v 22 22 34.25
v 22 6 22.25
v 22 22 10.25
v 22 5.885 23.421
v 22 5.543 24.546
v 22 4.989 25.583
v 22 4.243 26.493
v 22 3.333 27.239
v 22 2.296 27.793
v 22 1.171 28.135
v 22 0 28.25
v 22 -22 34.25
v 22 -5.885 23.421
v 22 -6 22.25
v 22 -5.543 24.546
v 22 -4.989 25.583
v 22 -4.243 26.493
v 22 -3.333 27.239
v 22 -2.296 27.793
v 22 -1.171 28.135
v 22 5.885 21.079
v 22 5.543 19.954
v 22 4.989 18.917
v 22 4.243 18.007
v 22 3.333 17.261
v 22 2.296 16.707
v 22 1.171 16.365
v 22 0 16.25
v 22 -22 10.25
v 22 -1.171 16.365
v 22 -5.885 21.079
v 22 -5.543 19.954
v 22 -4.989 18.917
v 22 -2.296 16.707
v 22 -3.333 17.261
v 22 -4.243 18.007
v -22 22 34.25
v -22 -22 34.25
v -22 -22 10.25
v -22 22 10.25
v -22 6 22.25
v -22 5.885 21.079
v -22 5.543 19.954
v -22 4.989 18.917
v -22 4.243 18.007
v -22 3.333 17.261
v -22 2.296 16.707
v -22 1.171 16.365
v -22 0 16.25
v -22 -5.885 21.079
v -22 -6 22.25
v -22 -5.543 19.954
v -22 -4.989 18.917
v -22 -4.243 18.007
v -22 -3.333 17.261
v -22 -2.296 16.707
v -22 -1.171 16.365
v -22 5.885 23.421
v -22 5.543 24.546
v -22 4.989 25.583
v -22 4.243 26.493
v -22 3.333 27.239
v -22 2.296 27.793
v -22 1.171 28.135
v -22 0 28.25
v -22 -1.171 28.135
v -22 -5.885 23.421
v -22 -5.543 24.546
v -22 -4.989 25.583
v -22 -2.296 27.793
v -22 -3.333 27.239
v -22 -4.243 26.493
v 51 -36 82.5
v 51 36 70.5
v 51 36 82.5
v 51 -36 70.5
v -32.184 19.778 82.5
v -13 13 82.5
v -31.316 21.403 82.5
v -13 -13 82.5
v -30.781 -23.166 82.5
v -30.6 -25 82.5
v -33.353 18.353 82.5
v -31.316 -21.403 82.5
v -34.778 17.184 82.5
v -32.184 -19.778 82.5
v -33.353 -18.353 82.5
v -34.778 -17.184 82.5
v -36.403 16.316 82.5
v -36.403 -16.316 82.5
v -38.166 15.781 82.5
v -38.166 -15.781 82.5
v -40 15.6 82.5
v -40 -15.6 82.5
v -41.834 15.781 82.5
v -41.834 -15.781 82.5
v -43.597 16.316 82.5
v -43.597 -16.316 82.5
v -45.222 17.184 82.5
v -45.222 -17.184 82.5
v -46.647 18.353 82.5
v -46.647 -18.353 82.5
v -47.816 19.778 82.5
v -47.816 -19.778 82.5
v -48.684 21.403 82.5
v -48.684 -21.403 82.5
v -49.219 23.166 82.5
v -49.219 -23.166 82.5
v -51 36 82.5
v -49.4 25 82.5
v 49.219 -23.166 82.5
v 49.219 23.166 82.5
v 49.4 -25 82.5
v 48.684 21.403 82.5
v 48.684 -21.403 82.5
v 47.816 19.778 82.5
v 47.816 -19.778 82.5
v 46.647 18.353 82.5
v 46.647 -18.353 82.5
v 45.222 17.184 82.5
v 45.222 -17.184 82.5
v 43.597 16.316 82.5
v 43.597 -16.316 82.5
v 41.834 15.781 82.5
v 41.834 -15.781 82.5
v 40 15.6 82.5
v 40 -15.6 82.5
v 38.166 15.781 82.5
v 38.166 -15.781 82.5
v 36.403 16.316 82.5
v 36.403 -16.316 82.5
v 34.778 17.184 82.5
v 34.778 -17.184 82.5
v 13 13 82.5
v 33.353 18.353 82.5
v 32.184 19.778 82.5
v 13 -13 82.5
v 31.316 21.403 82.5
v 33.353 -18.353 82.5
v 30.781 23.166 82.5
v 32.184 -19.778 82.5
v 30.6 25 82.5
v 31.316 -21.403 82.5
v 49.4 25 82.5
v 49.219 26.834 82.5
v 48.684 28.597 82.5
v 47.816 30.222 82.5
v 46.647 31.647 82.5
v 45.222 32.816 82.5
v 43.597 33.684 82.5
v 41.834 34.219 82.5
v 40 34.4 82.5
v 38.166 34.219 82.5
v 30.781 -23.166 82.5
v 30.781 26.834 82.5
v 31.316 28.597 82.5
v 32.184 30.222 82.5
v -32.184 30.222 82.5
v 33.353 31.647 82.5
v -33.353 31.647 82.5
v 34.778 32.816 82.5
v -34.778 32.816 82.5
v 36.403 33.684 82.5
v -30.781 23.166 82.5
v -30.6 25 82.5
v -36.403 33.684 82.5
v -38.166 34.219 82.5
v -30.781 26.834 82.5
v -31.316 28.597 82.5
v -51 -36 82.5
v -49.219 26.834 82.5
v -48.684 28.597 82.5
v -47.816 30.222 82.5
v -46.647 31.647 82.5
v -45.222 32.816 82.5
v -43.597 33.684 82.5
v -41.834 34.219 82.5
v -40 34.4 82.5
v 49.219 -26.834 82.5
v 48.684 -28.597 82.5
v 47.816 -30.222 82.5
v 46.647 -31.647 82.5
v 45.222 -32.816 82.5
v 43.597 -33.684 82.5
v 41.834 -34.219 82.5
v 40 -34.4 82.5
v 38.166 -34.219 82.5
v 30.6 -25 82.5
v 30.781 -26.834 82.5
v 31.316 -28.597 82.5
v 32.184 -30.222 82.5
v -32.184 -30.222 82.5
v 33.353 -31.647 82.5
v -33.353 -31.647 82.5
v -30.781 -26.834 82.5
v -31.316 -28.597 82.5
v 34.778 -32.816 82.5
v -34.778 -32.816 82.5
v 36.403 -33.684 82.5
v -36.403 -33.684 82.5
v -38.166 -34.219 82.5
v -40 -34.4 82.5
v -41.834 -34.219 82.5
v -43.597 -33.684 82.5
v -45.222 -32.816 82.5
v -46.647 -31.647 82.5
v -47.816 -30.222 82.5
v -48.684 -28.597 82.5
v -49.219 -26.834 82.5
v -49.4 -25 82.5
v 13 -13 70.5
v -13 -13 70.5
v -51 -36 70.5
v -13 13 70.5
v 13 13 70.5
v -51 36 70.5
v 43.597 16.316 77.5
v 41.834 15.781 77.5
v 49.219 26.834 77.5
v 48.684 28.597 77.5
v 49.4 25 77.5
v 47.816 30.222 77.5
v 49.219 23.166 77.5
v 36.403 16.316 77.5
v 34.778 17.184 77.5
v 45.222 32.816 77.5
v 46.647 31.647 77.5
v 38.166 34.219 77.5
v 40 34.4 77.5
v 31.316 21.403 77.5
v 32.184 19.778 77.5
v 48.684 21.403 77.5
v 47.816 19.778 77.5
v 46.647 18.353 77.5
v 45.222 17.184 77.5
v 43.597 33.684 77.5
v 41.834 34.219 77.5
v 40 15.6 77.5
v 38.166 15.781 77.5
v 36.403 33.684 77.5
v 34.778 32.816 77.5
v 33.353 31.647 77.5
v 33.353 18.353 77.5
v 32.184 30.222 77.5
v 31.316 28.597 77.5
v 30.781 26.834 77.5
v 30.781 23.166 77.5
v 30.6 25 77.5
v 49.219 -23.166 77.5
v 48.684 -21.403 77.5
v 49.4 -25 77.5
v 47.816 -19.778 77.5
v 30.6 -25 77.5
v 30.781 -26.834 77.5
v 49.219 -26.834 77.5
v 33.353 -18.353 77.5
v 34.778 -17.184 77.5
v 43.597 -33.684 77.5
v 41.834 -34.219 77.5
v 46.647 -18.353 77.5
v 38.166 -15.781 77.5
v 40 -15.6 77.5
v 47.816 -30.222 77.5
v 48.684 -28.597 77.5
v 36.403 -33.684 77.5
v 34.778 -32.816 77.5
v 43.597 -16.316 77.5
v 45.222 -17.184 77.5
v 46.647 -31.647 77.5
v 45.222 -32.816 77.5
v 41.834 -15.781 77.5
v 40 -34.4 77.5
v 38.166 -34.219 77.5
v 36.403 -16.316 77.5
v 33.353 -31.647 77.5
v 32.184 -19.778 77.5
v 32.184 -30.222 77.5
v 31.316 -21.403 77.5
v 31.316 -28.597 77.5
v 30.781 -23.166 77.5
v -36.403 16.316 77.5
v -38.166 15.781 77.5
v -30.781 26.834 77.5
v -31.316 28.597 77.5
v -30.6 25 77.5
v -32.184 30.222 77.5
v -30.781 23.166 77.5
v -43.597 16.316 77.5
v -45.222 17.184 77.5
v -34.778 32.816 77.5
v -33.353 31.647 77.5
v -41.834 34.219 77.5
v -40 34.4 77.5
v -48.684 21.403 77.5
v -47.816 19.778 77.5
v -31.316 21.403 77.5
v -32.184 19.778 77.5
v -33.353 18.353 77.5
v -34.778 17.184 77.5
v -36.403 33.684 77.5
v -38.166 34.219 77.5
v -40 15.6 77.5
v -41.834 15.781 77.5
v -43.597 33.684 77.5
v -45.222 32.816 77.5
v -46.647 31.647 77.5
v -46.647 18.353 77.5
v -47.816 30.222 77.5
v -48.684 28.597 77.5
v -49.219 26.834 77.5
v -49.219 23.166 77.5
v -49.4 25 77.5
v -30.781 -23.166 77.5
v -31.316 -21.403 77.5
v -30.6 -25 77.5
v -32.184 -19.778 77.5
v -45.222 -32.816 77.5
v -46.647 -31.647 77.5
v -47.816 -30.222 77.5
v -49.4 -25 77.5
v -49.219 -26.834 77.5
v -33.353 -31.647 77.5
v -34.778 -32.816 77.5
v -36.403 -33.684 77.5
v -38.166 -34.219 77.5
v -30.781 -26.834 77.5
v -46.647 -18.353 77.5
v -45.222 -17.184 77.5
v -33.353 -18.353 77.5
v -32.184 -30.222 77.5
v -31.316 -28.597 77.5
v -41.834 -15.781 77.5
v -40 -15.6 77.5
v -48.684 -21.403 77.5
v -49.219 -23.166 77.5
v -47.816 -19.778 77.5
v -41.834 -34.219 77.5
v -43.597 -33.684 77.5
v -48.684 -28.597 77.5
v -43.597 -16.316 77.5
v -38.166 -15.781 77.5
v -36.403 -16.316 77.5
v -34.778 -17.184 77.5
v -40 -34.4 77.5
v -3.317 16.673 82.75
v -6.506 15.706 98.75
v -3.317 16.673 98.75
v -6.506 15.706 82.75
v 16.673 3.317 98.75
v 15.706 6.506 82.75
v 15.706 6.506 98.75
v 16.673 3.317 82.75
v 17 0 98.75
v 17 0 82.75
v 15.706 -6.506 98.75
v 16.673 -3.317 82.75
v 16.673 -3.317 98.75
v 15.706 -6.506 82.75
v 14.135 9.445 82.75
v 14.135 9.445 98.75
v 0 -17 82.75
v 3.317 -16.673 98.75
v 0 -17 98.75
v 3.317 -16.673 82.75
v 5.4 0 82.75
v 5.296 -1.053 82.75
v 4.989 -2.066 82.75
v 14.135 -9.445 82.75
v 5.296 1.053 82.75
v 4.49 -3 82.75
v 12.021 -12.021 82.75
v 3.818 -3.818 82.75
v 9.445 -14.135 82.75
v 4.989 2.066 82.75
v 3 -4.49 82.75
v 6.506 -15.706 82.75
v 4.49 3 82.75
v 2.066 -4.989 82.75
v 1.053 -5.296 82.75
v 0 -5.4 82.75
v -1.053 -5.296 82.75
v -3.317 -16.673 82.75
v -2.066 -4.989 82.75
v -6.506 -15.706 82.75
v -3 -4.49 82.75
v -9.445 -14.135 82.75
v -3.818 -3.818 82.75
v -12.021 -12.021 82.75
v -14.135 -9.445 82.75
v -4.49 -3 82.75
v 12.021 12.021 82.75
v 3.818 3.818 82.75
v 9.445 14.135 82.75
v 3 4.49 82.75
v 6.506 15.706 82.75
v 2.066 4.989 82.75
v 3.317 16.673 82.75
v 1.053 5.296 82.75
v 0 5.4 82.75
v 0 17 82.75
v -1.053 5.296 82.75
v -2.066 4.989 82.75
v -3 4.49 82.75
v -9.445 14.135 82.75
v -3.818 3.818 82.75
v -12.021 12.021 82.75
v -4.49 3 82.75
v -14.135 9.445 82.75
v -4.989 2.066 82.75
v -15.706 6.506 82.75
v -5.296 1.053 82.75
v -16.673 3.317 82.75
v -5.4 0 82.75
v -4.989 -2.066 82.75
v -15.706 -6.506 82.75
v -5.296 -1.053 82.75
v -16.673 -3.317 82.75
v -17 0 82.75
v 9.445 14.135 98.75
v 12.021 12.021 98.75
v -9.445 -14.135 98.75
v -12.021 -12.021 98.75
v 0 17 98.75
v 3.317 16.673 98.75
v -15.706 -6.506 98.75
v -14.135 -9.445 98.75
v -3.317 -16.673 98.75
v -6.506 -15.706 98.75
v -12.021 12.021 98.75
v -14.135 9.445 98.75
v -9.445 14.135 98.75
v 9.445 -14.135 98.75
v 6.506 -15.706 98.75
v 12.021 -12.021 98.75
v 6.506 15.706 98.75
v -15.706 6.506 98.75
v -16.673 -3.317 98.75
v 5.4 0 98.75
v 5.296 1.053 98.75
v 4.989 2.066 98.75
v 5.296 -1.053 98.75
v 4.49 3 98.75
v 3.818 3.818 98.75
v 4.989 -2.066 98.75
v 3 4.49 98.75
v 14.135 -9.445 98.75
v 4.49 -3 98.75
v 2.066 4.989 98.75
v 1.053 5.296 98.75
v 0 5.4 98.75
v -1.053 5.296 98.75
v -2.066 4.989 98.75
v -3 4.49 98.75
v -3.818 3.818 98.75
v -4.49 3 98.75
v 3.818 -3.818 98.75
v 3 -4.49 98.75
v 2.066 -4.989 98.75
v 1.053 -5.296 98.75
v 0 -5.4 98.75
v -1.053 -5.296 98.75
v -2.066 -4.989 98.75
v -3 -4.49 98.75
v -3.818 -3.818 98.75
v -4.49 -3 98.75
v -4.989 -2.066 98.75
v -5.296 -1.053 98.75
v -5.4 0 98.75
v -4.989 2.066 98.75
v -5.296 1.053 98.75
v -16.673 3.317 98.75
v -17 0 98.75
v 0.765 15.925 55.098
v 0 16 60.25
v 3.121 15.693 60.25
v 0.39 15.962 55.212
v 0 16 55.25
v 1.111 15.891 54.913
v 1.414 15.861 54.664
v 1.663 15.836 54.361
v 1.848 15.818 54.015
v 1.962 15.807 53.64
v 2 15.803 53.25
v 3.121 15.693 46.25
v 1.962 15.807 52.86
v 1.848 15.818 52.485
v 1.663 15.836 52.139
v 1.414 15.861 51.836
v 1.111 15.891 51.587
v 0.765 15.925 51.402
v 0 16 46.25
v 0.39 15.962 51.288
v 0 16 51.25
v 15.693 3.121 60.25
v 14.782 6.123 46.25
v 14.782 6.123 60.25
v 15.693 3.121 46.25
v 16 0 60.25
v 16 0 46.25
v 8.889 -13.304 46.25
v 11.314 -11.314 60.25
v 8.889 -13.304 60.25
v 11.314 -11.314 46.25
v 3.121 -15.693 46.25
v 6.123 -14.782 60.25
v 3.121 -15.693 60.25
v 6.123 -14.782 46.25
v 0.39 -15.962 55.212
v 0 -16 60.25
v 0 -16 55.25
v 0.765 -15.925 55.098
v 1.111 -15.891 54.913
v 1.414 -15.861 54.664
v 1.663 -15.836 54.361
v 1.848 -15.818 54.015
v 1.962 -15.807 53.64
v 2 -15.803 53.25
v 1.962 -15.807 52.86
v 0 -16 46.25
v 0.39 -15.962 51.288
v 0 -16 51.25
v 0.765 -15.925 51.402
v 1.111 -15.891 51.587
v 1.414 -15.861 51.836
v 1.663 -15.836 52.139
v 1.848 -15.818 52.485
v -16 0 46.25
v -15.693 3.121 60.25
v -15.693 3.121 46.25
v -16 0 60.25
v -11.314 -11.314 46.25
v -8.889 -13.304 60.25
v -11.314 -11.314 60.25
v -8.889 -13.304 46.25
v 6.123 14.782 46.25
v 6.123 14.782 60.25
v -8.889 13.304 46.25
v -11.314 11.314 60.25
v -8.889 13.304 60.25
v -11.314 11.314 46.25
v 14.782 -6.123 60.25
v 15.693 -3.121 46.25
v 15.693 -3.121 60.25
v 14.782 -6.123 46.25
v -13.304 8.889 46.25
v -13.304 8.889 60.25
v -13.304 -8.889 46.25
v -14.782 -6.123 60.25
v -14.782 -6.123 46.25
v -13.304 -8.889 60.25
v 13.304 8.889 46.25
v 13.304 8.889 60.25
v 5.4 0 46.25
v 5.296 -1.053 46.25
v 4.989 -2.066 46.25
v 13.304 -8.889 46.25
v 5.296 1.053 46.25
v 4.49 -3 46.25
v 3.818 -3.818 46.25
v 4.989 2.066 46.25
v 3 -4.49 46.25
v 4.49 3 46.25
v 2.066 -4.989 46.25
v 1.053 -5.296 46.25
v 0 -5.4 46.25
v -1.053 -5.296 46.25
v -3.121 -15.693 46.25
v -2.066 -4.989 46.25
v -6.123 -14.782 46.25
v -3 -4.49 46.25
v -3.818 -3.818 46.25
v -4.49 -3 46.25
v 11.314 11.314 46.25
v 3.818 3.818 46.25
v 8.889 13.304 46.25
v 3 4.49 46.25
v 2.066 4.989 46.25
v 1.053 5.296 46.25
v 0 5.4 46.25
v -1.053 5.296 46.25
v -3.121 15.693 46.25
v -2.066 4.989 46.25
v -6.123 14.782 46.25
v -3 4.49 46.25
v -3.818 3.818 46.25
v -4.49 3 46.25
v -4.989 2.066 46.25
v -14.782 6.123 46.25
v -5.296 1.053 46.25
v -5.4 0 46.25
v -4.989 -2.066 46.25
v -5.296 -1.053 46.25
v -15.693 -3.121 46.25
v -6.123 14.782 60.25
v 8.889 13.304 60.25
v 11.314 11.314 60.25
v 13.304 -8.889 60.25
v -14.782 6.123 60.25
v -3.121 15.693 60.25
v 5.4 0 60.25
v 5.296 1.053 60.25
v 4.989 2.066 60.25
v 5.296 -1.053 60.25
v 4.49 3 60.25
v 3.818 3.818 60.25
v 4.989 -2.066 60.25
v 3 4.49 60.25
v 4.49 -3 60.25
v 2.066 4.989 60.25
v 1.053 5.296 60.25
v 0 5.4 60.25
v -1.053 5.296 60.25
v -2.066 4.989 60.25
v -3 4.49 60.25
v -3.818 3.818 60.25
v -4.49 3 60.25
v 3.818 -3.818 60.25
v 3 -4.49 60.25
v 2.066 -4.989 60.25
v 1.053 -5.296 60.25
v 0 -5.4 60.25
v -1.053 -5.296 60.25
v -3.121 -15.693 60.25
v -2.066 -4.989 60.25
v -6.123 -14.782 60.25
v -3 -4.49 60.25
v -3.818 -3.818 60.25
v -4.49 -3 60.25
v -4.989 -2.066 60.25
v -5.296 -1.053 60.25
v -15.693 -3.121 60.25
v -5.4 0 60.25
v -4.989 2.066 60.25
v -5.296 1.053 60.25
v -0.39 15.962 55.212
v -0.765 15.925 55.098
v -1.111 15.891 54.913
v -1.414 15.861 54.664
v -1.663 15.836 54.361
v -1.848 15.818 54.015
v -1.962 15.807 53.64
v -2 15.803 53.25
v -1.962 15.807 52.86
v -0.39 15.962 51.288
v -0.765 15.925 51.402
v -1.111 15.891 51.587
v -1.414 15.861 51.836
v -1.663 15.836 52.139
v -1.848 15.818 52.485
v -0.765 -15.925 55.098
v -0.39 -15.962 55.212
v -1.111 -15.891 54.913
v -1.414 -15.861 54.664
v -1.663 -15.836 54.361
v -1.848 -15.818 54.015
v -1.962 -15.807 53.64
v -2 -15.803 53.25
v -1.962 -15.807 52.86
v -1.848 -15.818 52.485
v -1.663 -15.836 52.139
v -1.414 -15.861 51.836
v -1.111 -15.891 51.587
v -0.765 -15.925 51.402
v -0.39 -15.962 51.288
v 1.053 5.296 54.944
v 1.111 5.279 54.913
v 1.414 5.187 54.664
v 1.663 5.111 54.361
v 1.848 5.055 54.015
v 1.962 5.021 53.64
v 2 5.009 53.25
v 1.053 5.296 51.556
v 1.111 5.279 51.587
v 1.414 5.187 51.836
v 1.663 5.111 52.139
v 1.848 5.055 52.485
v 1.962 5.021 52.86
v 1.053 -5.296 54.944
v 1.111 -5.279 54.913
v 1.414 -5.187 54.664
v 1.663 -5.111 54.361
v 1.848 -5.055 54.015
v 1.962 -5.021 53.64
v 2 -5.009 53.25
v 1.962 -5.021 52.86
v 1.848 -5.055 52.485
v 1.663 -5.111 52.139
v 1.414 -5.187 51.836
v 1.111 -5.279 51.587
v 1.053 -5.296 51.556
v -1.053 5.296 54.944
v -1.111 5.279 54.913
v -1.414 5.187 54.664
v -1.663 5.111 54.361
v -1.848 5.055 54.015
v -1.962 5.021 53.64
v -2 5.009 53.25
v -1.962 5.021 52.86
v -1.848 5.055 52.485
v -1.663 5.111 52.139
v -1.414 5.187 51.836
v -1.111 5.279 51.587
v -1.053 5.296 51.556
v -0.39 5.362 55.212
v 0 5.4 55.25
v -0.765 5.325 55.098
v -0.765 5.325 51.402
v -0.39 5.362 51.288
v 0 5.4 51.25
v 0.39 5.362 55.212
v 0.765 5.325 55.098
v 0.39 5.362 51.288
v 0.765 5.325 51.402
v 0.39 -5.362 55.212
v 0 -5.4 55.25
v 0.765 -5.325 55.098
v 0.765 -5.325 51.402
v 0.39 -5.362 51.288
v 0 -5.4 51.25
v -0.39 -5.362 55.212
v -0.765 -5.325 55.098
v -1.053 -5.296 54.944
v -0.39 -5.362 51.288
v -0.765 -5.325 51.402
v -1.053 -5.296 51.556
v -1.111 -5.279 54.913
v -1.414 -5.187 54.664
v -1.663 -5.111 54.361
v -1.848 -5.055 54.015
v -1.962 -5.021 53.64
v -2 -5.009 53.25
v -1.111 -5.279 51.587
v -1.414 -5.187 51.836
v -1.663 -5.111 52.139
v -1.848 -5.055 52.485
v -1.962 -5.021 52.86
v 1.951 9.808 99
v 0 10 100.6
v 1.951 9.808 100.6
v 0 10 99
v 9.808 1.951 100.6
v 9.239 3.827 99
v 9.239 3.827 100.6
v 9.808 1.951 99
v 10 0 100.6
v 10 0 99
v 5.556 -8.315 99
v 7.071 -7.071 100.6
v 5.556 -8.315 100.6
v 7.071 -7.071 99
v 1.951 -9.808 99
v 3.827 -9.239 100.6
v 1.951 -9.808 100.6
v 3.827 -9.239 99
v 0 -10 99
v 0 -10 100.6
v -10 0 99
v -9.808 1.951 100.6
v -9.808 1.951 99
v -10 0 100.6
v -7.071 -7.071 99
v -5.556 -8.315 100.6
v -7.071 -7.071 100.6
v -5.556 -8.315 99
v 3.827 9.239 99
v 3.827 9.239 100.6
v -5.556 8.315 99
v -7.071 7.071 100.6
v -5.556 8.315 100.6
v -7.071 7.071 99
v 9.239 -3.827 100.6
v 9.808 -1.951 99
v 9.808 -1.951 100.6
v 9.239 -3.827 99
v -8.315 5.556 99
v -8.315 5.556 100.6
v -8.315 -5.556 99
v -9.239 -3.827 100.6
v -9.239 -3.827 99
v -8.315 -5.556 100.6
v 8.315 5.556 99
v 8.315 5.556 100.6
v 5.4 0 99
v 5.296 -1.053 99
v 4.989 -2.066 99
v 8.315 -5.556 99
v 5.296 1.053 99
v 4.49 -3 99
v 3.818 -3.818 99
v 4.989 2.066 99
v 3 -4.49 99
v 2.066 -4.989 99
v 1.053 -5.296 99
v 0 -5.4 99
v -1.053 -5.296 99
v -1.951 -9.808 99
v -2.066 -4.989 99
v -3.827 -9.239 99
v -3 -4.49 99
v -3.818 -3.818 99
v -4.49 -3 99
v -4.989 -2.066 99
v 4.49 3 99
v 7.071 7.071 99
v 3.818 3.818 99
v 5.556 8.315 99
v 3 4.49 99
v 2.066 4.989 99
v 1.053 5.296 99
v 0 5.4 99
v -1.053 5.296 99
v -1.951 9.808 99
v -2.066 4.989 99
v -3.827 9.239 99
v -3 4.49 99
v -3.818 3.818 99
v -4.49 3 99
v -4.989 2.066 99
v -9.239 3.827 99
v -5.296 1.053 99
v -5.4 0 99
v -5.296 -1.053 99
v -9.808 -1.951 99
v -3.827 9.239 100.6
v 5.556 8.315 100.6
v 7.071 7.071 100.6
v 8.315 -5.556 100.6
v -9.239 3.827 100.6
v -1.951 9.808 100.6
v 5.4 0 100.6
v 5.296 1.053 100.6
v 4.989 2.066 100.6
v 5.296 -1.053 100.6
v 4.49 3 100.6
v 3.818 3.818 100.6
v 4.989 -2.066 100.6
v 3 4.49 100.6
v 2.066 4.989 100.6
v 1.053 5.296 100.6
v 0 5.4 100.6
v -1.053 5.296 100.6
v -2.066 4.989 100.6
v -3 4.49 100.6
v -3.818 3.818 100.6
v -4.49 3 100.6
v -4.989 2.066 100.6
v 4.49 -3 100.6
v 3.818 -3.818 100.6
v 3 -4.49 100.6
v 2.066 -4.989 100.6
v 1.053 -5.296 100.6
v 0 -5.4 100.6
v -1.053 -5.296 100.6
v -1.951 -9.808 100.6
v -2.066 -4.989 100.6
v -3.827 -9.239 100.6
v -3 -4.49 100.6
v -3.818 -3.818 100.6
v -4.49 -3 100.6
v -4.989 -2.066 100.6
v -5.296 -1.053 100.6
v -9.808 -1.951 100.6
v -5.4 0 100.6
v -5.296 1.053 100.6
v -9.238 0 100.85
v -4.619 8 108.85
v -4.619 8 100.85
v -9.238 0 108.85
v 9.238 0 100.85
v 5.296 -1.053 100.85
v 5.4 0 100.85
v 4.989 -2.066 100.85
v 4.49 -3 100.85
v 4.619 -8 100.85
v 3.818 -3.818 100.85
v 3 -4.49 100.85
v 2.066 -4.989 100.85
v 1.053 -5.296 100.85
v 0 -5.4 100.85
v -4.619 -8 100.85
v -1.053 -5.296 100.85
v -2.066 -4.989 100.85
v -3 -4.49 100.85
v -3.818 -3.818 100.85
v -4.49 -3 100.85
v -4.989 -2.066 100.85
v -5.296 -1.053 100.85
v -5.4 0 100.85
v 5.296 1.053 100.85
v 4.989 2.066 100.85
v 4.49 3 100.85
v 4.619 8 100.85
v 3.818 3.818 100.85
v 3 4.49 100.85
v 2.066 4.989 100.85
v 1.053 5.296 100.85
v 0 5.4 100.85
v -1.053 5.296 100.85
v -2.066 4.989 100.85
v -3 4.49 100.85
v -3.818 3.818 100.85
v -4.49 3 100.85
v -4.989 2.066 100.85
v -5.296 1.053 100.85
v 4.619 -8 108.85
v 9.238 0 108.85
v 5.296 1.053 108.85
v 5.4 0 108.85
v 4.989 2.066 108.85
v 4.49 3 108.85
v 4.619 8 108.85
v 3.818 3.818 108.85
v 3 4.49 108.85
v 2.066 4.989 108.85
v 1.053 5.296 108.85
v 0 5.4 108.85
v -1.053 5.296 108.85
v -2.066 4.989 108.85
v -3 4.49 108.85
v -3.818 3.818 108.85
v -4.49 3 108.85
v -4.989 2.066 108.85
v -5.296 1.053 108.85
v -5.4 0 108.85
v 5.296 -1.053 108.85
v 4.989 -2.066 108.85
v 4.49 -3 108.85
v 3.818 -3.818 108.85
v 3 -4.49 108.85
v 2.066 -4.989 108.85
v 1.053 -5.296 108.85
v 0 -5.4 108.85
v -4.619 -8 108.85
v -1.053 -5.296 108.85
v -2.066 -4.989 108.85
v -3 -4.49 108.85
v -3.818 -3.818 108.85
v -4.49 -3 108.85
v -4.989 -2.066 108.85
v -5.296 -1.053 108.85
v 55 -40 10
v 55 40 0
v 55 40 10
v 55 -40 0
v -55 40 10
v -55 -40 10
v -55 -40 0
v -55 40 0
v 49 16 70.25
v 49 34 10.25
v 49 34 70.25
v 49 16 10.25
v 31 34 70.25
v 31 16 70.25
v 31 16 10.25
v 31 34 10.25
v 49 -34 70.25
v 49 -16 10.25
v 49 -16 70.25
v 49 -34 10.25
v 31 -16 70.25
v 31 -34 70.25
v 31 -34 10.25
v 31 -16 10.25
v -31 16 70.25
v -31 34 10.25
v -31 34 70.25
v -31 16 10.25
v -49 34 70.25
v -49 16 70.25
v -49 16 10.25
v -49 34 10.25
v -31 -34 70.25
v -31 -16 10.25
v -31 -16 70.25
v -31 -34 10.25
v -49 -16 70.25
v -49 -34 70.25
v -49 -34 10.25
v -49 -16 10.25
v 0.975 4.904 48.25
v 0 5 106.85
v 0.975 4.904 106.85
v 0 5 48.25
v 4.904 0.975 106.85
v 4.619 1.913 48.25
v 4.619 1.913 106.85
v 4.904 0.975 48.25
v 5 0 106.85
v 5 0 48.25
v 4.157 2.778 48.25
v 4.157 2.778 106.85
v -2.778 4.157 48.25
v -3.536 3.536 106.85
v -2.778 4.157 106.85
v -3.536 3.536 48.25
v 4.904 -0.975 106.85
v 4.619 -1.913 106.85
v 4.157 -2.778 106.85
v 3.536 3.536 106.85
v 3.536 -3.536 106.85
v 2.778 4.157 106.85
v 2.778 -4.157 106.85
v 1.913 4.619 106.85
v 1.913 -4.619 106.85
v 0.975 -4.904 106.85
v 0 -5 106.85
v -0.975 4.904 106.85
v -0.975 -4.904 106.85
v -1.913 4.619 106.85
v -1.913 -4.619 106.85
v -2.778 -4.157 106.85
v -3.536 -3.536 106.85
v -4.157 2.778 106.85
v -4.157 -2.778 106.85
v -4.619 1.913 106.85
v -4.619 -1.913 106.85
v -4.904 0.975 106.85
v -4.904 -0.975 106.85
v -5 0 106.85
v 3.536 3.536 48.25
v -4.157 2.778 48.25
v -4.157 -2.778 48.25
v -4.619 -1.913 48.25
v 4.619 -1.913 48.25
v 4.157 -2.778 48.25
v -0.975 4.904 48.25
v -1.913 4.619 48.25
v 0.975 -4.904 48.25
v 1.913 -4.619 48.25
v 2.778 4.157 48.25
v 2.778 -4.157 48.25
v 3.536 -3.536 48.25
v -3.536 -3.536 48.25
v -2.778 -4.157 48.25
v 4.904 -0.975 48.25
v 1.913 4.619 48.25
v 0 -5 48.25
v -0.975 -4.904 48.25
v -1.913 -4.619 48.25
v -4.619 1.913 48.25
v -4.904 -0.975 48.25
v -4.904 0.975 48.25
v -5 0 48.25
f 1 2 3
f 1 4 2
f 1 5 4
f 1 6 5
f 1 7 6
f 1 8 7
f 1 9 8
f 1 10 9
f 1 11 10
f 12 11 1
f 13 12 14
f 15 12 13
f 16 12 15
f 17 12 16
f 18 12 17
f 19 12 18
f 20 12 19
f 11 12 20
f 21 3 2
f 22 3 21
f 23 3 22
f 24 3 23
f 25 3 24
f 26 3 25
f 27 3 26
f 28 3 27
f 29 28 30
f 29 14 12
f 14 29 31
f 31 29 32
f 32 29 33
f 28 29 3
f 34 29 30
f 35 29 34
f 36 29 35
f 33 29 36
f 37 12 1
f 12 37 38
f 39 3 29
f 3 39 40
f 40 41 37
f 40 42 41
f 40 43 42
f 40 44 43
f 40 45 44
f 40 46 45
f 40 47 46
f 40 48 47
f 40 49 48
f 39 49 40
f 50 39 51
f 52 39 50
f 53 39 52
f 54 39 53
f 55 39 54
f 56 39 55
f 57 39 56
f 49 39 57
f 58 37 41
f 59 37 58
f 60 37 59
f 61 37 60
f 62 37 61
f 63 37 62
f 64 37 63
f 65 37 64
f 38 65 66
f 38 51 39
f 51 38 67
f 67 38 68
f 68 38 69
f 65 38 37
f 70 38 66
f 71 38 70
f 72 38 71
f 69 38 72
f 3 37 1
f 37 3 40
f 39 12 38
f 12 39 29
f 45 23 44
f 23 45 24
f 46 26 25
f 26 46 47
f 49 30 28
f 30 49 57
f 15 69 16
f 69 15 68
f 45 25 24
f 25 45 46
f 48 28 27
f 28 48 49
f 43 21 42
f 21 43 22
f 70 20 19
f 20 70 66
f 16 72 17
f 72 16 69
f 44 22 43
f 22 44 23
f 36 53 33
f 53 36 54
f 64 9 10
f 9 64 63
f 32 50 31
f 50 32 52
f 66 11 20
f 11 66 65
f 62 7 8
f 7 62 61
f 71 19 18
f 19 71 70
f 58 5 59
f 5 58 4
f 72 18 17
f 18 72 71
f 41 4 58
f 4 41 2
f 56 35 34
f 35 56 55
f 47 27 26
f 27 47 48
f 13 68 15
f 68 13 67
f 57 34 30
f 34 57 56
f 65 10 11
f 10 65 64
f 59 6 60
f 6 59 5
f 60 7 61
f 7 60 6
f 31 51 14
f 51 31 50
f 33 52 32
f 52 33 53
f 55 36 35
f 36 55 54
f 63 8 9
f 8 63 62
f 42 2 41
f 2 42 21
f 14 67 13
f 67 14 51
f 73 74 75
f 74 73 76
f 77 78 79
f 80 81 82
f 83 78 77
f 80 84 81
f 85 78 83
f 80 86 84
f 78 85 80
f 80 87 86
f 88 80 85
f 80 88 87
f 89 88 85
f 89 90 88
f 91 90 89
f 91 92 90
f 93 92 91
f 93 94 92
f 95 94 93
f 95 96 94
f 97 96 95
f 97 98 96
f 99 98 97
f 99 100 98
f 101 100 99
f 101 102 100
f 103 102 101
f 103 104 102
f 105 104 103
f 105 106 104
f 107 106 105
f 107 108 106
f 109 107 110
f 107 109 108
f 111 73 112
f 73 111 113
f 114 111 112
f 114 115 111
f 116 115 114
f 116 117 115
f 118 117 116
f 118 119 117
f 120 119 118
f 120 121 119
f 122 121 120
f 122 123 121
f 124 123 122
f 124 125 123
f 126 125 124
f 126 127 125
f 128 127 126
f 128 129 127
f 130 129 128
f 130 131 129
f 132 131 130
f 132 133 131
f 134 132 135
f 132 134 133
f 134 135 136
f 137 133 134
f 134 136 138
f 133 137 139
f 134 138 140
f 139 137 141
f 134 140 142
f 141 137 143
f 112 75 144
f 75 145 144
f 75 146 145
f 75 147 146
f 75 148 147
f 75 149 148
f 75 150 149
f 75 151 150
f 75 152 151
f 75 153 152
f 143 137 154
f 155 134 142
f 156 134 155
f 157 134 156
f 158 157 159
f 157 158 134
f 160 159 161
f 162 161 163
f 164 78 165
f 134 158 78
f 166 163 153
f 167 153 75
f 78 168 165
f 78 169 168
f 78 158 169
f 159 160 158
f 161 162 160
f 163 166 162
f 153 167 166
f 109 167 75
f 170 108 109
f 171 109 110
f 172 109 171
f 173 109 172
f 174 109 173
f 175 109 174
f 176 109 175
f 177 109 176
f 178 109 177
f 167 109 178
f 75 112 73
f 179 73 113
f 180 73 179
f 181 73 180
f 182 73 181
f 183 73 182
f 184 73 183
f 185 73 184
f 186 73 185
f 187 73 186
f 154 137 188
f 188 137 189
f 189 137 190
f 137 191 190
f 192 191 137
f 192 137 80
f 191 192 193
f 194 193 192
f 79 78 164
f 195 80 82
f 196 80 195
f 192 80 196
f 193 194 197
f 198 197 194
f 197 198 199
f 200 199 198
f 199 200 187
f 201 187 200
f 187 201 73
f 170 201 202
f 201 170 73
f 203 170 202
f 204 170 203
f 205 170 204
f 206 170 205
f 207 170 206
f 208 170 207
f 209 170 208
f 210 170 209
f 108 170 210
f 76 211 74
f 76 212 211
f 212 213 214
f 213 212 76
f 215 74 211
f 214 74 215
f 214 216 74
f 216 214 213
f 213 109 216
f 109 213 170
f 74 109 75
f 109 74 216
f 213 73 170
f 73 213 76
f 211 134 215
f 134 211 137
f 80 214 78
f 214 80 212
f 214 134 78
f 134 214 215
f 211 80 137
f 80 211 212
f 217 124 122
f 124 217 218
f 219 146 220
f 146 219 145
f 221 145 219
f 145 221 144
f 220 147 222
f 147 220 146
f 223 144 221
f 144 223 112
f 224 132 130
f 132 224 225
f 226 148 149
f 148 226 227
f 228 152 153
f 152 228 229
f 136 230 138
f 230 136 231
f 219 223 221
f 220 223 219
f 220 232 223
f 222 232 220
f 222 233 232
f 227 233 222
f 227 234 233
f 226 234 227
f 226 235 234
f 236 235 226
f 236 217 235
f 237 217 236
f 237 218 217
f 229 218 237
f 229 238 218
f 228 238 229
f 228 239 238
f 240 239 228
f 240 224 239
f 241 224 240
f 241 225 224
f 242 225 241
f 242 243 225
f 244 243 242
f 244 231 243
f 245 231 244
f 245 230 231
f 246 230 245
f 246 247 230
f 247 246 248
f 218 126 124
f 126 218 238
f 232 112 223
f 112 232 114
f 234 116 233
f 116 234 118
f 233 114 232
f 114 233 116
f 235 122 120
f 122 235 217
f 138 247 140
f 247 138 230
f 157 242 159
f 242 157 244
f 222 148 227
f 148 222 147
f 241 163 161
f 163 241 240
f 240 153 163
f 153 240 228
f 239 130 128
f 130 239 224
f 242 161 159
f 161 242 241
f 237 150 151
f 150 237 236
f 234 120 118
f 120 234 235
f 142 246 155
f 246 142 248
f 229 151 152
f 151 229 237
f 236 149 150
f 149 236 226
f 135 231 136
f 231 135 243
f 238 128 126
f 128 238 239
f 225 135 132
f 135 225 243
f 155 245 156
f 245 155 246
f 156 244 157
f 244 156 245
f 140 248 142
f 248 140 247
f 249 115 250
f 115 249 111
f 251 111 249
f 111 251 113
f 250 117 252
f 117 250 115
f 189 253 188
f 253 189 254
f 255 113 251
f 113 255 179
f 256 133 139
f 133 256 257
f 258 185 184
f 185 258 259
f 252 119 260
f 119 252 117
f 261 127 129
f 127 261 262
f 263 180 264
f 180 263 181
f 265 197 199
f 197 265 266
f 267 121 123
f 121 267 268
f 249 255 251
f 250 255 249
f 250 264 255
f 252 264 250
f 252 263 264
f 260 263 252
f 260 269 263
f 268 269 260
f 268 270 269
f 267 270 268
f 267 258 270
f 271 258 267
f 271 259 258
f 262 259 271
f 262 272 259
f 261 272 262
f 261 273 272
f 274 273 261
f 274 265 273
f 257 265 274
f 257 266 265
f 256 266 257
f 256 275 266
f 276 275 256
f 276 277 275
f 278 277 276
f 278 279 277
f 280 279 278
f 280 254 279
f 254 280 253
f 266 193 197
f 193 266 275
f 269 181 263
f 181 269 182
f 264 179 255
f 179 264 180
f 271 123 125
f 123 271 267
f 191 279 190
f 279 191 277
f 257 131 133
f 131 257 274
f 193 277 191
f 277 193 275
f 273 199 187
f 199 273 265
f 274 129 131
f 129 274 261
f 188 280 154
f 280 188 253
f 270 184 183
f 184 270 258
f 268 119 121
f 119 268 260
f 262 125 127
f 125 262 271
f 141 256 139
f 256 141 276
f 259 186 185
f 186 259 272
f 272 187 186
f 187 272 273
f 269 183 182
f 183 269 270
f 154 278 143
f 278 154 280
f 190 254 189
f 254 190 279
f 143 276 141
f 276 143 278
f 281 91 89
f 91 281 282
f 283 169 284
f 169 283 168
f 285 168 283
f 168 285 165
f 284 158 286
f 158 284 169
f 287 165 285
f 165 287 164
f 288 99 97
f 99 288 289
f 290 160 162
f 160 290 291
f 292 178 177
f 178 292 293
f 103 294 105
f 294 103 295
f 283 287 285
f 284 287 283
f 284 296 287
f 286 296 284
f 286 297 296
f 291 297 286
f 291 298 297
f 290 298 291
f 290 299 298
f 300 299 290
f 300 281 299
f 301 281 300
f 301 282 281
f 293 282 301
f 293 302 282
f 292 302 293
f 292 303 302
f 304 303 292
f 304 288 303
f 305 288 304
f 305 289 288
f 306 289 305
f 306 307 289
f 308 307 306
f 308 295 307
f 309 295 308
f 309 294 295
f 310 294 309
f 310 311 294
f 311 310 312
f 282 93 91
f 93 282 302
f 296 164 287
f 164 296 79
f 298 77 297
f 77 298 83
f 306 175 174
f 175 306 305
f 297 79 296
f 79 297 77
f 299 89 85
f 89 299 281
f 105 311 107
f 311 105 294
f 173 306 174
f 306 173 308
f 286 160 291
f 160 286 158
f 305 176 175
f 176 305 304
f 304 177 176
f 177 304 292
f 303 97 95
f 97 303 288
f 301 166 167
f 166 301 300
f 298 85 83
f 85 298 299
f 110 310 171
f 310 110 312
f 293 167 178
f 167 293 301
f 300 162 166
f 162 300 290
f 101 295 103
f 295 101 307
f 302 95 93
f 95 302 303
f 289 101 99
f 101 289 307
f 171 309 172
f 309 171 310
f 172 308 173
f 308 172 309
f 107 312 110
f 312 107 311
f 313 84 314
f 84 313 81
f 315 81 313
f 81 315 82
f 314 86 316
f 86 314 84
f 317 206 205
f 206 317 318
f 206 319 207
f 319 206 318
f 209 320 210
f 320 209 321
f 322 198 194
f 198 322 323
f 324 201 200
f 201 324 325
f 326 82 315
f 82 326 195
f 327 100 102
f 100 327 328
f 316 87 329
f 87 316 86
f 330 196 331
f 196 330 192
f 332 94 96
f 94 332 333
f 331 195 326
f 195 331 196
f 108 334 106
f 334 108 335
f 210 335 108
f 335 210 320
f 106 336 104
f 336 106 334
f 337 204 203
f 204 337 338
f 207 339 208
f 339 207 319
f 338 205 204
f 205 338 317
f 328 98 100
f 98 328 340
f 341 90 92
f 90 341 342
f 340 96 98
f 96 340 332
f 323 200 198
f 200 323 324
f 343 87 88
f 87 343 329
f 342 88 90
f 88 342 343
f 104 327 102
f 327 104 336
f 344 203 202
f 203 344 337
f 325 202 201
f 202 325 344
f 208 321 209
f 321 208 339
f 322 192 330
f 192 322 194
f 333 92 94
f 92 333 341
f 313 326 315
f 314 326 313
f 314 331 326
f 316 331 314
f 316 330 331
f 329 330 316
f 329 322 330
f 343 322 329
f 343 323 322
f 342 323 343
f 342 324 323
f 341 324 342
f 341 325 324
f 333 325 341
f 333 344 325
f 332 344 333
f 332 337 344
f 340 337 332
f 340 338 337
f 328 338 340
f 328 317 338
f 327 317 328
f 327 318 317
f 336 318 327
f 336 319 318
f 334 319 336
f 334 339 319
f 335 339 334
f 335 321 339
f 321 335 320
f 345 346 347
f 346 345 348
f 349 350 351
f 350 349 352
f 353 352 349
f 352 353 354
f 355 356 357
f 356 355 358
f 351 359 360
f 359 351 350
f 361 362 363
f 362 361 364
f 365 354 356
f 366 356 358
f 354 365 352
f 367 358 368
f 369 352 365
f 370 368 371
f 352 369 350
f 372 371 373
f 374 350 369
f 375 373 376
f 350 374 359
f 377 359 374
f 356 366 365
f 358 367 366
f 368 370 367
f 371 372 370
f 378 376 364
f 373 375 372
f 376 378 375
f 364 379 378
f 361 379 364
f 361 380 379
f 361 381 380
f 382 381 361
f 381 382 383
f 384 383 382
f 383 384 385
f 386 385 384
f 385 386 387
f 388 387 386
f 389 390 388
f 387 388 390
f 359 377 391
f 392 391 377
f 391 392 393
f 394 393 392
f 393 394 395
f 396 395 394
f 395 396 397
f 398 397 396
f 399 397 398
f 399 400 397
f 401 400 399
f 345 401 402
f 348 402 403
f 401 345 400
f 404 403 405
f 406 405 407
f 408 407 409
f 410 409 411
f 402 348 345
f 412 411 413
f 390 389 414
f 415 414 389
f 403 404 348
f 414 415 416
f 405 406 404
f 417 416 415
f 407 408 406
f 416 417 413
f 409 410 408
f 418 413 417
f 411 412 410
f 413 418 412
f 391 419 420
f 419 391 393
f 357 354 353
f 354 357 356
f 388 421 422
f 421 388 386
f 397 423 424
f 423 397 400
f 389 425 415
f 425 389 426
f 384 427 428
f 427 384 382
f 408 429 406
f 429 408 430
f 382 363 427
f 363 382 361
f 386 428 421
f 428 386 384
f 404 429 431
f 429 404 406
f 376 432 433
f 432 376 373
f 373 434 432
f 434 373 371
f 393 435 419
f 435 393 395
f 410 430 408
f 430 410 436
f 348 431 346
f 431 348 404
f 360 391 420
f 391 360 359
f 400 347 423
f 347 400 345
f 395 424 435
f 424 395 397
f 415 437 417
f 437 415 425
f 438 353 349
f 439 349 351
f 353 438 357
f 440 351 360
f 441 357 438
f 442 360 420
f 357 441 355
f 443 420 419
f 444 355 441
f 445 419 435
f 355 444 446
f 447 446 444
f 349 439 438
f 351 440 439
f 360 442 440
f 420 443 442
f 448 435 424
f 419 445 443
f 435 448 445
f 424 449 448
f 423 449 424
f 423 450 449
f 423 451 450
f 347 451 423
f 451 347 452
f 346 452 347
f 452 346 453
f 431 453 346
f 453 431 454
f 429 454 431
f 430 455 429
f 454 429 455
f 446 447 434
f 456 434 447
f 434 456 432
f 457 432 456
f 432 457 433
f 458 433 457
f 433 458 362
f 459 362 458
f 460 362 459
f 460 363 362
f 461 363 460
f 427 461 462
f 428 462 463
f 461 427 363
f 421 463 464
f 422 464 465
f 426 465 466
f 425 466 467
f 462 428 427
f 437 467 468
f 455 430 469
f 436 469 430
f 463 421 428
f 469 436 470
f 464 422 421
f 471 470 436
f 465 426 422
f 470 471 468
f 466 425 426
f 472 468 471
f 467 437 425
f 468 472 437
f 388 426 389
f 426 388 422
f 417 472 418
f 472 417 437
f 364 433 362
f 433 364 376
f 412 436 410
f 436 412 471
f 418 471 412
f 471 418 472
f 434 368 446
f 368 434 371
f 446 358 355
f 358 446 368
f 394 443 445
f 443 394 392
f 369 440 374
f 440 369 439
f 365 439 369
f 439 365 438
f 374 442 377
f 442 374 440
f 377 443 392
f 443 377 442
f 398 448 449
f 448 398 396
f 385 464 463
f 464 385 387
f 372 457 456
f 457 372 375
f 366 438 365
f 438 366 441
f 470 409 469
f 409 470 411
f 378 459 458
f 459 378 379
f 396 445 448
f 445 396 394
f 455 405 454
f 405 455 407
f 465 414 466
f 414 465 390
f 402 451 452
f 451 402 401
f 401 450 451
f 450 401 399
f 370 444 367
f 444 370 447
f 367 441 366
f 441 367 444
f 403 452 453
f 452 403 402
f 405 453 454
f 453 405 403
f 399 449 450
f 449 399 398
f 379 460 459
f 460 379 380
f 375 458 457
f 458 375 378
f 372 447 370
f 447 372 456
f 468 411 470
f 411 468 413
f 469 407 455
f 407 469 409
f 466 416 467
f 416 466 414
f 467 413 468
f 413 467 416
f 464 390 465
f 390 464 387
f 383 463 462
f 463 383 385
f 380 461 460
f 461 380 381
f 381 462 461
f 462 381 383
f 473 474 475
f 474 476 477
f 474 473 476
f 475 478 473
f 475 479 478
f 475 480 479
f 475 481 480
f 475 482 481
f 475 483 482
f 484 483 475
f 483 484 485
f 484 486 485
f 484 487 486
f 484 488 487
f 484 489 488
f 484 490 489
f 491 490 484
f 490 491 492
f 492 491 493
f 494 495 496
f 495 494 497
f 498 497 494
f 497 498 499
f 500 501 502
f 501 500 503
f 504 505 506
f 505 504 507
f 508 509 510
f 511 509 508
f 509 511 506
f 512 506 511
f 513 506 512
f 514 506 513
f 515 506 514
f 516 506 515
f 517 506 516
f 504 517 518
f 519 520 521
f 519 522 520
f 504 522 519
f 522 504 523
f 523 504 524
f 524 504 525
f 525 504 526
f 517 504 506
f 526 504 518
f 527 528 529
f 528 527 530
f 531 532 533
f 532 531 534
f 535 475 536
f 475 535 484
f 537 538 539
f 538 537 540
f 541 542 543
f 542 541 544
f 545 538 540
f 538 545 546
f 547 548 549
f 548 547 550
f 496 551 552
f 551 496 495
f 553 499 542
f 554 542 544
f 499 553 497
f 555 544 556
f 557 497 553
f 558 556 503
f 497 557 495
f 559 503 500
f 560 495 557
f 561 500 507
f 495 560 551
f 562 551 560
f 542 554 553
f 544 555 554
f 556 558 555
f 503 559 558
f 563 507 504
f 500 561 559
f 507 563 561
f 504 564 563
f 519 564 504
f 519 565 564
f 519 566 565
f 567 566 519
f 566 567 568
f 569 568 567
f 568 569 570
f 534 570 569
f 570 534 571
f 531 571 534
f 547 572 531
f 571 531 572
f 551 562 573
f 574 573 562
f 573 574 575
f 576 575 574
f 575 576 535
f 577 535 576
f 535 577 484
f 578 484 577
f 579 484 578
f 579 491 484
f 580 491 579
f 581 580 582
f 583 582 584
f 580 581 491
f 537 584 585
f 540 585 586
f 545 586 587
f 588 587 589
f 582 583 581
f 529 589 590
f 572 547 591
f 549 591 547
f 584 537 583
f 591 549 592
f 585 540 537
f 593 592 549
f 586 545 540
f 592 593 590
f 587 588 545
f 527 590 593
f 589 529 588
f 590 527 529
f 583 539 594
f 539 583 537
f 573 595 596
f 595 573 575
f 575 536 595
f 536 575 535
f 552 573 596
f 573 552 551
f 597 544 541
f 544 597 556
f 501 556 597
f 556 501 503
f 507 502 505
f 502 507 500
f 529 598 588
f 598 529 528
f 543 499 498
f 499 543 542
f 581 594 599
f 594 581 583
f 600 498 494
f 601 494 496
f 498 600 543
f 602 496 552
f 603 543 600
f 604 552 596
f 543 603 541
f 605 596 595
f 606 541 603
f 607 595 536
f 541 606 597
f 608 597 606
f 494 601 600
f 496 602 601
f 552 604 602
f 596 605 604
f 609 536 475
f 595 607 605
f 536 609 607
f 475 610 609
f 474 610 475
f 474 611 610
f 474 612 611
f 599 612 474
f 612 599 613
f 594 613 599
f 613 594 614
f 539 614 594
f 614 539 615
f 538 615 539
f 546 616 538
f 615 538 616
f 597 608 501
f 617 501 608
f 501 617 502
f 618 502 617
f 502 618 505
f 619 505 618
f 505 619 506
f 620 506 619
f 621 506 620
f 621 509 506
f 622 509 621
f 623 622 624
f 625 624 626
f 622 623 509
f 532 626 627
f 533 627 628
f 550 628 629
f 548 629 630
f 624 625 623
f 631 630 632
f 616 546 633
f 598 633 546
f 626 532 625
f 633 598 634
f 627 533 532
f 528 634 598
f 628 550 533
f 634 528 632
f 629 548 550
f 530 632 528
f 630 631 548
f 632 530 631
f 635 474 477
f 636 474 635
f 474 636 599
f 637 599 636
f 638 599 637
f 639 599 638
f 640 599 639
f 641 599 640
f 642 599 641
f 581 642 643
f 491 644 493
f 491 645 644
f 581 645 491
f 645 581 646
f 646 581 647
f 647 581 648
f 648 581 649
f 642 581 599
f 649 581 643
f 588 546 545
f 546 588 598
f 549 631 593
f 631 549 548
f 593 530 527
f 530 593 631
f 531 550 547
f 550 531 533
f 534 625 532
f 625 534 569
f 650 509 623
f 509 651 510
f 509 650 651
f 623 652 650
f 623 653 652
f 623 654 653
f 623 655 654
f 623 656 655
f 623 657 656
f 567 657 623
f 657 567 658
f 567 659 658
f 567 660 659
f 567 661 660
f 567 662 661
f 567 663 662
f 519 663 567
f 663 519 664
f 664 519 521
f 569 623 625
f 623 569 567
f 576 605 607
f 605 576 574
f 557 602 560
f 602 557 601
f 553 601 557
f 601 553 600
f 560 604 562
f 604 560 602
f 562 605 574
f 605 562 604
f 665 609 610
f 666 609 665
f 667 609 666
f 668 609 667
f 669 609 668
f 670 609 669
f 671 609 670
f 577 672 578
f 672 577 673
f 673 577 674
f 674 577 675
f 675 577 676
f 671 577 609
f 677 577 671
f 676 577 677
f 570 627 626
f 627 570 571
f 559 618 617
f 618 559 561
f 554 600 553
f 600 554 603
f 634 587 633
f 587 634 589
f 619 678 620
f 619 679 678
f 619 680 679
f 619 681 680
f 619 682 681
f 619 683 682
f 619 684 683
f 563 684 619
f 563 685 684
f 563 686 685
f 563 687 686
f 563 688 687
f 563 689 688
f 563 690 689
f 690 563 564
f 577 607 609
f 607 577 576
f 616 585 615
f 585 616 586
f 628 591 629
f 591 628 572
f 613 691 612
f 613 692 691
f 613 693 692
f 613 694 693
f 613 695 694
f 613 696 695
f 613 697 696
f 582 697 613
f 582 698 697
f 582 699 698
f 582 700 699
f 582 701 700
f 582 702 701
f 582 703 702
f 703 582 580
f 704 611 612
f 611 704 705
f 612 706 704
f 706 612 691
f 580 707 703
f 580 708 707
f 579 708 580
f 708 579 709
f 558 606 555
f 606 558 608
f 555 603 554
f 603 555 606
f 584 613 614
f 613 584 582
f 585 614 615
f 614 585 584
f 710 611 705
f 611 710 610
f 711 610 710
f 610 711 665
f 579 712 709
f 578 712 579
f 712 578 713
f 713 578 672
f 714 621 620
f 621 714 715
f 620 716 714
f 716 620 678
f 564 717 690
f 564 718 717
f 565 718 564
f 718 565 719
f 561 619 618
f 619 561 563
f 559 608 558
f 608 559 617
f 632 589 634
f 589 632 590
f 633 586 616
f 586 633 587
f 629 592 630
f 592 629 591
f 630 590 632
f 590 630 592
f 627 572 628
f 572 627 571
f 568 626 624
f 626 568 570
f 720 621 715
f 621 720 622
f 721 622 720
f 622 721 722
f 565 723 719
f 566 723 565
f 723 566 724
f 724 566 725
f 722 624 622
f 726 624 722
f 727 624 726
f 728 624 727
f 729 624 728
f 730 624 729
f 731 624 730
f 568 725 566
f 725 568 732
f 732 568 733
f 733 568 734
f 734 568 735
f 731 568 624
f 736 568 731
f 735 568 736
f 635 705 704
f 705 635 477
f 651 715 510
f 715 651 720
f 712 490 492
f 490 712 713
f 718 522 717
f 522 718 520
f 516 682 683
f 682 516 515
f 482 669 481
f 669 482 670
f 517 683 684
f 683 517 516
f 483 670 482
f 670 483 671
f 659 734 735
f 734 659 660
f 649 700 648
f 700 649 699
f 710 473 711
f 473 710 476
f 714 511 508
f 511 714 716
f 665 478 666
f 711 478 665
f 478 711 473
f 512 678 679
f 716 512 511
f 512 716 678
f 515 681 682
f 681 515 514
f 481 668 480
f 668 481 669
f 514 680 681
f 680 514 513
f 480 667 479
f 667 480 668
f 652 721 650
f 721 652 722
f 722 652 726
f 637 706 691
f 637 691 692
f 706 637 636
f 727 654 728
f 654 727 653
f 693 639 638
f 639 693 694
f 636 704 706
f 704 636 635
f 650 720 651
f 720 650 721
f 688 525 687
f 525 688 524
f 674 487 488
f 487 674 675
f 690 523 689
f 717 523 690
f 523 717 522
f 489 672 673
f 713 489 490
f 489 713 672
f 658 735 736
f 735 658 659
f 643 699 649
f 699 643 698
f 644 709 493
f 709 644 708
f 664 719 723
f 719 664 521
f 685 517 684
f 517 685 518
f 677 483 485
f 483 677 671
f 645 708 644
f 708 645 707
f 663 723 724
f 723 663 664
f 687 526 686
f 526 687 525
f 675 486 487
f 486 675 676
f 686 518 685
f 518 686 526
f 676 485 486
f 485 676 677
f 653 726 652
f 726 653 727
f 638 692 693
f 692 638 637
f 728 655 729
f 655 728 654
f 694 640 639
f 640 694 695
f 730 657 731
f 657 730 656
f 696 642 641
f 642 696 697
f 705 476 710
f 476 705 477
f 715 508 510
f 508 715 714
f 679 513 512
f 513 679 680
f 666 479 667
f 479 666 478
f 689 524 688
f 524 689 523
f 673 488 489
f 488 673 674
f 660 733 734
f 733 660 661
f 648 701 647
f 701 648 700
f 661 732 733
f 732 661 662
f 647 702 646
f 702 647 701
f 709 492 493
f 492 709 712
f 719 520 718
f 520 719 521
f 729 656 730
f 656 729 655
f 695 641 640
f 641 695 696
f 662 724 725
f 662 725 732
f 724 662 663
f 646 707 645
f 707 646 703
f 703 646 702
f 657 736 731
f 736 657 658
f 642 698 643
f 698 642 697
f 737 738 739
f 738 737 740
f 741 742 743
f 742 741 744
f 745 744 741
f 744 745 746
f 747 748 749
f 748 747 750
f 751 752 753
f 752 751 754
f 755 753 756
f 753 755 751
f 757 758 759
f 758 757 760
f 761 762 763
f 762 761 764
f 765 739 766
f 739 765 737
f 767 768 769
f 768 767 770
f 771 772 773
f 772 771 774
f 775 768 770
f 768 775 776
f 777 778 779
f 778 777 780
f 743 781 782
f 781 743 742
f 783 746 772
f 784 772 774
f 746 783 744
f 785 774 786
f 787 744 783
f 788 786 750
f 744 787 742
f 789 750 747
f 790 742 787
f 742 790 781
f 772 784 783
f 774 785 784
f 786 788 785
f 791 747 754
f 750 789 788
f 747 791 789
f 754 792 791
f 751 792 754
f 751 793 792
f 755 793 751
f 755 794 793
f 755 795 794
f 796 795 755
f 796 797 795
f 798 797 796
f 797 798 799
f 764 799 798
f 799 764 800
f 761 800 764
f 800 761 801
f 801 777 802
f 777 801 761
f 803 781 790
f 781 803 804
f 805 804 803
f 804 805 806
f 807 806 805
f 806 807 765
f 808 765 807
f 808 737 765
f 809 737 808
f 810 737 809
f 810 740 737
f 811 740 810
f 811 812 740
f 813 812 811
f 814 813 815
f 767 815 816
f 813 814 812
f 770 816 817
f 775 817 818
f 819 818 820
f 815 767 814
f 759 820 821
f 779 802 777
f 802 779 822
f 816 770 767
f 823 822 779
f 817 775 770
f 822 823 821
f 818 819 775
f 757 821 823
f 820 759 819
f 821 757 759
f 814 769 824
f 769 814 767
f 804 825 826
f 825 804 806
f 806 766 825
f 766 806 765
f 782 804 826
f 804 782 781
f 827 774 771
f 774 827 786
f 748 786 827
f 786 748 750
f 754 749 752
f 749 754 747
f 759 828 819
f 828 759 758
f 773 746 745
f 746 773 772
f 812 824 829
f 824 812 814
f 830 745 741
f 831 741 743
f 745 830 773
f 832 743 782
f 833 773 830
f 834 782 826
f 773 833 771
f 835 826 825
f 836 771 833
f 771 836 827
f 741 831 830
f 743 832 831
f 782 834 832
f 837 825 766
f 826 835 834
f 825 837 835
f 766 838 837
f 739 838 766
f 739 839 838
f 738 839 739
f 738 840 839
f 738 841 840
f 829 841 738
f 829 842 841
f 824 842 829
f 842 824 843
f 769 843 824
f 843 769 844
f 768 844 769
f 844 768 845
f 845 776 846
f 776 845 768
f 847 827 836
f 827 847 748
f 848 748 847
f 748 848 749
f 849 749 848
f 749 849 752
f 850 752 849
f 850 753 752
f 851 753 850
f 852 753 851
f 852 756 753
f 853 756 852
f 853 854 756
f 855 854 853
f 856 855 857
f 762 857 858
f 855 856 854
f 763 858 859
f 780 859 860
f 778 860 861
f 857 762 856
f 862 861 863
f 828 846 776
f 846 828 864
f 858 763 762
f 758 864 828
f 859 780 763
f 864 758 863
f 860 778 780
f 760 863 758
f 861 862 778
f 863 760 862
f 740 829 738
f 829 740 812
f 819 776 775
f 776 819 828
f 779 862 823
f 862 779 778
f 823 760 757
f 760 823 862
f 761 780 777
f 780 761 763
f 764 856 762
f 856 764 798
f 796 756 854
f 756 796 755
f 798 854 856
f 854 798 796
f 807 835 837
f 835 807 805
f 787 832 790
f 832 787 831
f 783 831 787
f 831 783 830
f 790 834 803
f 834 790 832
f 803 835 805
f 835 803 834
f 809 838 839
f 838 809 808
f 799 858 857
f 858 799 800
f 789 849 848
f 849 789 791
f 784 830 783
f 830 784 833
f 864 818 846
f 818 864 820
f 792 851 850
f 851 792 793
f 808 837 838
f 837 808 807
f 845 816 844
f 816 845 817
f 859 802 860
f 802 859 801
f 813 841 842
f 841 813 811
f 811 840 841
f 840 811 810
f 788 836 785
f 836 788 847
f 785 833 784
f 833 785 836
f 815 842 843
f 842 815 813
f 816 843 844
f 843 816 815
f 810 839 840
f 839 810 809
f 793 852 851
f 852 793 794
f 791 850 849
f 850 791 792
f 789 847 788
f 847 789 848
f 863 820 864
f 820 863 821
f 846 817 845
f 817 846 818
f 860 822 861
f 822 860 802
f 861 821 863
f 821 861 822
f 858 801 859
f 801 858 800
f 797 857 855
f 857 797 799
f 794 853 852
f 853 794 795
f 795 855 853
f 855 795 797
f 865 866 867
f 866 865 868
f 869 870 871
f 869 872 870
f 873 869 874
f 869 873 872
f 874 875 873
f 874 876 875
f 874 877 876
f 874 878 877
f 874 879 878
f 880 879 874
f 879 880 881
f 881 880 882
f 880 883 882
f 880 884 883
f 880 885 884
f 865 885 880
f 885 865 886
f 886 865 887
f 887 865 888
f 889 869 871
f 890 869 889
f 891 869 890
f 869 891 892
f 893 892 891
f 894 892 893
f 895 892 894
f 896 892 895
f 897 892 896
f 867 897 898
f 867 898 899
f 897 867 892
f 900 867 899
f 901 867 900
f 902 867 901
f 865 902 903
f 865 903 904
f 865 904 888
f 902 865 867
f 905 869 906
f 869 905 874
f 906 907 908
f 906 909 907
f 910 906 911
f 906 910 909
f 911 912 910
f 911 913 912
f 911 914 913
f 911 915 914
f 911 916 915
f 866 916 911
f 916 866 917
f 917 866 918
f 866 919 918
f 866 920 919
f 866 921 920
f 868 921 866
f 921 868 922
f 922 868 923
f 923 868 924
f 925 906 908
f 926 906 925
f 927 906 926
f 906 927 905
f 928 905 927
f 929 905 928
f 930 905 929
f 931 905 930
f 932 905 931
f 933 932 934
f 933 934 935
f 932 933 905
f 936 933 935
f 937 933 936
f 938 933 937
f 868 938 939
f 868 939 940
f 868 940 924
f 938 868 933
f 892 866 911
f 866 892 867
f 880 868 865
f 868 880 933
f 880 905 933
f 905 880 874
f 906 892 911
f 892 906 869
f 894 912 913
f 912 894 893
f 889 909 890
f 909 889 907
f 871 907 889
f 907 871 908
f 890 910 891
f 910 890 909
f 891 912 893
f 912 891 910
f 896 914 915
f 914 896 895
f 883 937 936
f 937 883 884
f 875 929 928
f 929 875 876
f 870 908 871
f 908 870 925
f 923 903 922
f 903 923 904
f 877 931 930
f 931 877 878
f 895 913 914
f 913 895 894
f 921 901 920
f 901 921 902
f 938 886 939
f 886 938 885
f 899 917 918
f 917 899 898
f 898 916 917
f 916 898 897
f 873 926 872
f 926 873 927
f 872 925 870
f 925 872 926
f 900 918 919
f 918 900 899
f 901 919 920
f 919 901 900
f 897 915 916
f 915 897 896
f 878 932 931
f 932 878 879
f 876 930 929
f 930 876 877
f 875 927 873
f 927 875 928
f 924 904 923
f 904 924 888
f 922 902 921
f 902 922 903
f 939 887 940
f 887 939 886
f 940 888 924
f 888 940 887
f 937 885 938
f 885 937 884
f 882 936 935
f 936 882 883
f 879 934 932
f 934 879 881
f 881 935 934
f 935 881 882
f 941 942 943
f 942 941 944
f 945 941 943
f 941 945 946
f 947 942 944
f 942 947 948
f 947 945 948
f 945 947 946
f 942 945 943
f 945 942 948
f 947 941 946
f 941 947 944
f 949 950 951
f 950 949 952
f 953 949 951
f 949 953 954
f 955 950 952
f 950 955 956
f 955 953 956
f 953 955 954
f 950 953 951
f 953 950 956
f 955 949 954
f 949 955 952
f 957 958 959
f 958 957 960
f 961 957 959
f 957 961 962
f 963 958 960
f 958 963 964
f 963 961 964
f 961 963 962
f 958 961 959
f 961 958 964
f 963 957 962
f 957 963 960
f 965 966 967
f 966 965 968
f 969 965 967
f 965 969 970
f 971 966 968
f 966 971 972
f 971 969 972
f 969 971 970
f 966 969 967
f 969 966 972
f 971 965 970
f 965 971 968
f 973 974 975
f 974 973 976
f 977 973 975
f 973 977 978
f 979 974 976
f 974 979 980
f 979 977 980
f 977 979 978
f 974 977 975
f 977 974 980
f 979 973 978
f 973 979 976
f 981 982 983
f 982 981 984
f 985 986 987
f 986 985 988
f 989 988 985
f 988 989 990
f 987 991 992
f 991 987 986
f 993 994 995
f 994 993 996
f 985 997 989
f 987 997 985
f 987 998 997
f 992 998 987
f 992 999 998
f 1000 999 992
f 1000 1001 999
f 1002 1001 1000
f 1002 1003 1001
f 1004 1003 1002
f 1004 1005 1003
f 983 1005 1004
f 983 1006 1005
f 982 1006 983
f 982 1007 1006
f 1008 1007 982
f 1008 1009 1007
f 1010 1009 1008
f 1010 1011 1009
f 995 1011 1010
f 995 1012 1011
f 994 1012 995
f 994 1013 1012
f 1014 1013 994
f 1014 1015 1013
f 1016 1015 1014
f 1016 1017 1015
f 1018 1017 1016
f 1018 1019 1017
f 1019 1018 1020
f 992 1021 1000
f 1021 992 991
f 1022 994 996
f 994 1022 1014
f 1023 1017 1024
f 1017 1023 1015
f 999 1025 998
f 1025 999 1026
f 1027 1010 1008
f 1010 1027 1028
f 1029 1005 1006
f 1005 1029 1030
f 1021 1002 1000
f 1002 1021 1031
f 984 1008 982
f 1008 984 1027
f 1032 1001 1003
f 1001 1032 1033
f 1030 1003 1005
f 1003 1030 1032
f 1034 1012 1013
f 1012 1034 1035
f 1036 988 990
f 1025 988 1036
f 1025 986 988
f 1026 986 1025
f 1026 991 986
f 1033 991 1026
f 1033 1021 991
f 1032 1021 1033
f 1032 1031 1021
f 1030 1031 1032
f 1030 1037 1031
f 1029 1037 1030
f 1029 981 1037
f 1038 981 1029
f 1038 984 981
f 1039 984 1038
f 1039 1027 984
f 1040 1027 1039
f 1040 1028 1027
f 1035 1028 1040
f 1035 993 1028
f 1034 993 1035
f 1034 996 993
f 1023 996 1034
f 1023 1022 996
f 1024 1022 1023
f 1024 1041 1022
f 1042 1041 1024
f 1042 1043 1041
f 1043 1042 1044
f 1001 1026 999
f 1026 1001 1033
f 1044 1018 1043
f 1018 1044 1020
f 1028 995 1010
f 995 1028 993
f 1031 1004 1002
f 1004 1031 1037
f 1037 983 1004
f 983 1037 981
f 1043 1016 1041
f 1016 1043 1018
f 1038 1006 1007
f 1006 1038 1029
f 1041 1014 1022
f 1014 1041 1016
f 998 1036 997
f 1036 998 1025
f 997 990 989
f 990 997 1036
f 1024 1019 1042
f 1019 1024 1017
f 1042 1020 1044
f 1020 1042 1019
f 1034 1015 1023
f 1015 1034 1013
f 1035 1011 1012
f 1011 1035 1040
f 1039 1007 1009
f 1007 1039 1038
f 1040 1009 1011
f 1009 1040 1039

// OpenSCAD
$fn = 32;

// ------------------------------------------------------------------------
// Arbor press fixture: screw d10, posts 60 mm, gap 12 mm
// Every part is its own module, assembly() places every instance.
// ------------------------------------------------------------------------

// --- part 1 ---
module press_bed() {
  difference() {
    translate([-55, -40, 0]) cube([110, 80, 10]);
  }
}

// --- part 2 ---
module anvil_block() {
  difference() {
    translate([-22, -22, 0]) cube([44, 44, 24]);
    translate([0, 0, 12]) rotate([0, 90, 0]) cylinder(h = 46, d = 12, center = true);
  }
}

// --- part 3 ---
module press_post_a() {
  translate([-9, -9, 0]) cube([18, 18, 60]);
}

// --- part 4 ---
module press_post_b() {
  translate([-9, -9, 0]) cube([18, 18, 60]);
}

// --- part 5 ---
module press_post_c() {
  translate([-9, -9, 0]) cube([18, 18, 60]);
}

// --- part 6 ---
module press_post_d() {
  translate([-9, -9, 0]) cube([18, 18, 60]);
}

// --- part 7 ---
module press_frame() {
  difference() {
    translate([-51, -36, 0]) cube([102, 72, 12]);
    translate([-13, -13, -1]) cube([26, 26, 14]);
    translate([40, 25, 7]) cylinder(h = 6, d = 18.8);
    translate([40, -25, 7]) cylinder(h = 6, d = 18.8);
    translate([-40, 25, 7]) cylinder(h = 6, d = 18.8);
    translate([-40, -25, 7]) cylinder(h = 6, d = 18.8);
  }
}

// --- part 8 ---
module guide_ring() {
  difference() {
      translate([0, 0, 0]) cylinder(h = 16, d = 34);
      translate([0, 0, -1]) cylinder(h = 18, d = 10.8);
    }
}

// --- part 9 ---
module press_screw() {
  translate([0, 0, -29.3]) cylinder(h = 58.6, d = 10);
}

// --- part 10 ---
module press_head() {
  difference() {
    cylinder(h = 14, d = 32);
    translate([0, 0, -1]) cylinder(h = 16, d = 10.8);
    translate([0, 0, 7]) rotate([90, 0, 0]) cylinder(h = 34, d = 4, center = true);
  }
}

// --- part 11 ---
module nut_washer() {
  difference() {
      translate([0, 0, 0]) cylinder(h = 1.6, d = 20);
      translate([0, 0, -1]) cylinder(h = 3.6, d = 10.8);
    }
}

// --- part 12 ---
module press_nut() {
  difference() {
    linear_extrude(height = 8) polygon(points = [[9.238, 0], [4.619, 8], [-4.619, 8], [-9.238, 0], [-4.619, -8], [4.619, -8]]);
    translate([0, 0, -1]) cylinder(h = 10, d = 10.8);
  }
}

// --- assembly ---
module assembly() {
  color([0.80, 0.24, 0.20]) translate([0, 0, 0]) rotate([0, 0, 0]) press_bed();
  color([0.20, 0.45, 0.75]) translate([0, 0, 10.25]) rotate([0, 0, 0]) anvil_block();
  color([0.25, 0.62, 0.32]) translate([40, 25, 10.25]) rotate([0, 0, 0]) press_post_a();
  color([0.92, 0.70, 0.18]) translate([40, -25, 10.25]) rotate([0, 0, 0]) press_post_b();
  color([0.58, 0.35, 0.70]) translate([-40, 25, 10.25]) rotate([0, 0, 0]) press_post_c();
  color([0.16, 0.66, 0.66]) translate([-40, -25, 10.25]) rotate([0, 0, 0]) press_post_d();
  color([0.85, 0.48, 0.18]) translate([0, 0, 70.5]) rotate([0, 0, 0]) press_frame();
  color([0.55, 0.60, 0.65]) translate([0, 0, 82.75]) rotate([0, 0, 0]) guide_ring();
  color([0.75, 0.30, 0.55]) translate([0, 0, 77.55]) rotate([0, 0, 0]) press_screw();
  color([0.42, 0.52, 0.28]) translate([0, 0, 46.25]) rotate([0, 0, 0]) press_head();
  color([0.80, 0.24, 0.20]) translate([0, 0, 99]) rotate([0, 0, 0]) nut_washer();
  color([0.20, 0.45, 0.75]) translate([0, 0, 100.85]) rotate([0, 0, 0]) press_nut();
}

assembly();
